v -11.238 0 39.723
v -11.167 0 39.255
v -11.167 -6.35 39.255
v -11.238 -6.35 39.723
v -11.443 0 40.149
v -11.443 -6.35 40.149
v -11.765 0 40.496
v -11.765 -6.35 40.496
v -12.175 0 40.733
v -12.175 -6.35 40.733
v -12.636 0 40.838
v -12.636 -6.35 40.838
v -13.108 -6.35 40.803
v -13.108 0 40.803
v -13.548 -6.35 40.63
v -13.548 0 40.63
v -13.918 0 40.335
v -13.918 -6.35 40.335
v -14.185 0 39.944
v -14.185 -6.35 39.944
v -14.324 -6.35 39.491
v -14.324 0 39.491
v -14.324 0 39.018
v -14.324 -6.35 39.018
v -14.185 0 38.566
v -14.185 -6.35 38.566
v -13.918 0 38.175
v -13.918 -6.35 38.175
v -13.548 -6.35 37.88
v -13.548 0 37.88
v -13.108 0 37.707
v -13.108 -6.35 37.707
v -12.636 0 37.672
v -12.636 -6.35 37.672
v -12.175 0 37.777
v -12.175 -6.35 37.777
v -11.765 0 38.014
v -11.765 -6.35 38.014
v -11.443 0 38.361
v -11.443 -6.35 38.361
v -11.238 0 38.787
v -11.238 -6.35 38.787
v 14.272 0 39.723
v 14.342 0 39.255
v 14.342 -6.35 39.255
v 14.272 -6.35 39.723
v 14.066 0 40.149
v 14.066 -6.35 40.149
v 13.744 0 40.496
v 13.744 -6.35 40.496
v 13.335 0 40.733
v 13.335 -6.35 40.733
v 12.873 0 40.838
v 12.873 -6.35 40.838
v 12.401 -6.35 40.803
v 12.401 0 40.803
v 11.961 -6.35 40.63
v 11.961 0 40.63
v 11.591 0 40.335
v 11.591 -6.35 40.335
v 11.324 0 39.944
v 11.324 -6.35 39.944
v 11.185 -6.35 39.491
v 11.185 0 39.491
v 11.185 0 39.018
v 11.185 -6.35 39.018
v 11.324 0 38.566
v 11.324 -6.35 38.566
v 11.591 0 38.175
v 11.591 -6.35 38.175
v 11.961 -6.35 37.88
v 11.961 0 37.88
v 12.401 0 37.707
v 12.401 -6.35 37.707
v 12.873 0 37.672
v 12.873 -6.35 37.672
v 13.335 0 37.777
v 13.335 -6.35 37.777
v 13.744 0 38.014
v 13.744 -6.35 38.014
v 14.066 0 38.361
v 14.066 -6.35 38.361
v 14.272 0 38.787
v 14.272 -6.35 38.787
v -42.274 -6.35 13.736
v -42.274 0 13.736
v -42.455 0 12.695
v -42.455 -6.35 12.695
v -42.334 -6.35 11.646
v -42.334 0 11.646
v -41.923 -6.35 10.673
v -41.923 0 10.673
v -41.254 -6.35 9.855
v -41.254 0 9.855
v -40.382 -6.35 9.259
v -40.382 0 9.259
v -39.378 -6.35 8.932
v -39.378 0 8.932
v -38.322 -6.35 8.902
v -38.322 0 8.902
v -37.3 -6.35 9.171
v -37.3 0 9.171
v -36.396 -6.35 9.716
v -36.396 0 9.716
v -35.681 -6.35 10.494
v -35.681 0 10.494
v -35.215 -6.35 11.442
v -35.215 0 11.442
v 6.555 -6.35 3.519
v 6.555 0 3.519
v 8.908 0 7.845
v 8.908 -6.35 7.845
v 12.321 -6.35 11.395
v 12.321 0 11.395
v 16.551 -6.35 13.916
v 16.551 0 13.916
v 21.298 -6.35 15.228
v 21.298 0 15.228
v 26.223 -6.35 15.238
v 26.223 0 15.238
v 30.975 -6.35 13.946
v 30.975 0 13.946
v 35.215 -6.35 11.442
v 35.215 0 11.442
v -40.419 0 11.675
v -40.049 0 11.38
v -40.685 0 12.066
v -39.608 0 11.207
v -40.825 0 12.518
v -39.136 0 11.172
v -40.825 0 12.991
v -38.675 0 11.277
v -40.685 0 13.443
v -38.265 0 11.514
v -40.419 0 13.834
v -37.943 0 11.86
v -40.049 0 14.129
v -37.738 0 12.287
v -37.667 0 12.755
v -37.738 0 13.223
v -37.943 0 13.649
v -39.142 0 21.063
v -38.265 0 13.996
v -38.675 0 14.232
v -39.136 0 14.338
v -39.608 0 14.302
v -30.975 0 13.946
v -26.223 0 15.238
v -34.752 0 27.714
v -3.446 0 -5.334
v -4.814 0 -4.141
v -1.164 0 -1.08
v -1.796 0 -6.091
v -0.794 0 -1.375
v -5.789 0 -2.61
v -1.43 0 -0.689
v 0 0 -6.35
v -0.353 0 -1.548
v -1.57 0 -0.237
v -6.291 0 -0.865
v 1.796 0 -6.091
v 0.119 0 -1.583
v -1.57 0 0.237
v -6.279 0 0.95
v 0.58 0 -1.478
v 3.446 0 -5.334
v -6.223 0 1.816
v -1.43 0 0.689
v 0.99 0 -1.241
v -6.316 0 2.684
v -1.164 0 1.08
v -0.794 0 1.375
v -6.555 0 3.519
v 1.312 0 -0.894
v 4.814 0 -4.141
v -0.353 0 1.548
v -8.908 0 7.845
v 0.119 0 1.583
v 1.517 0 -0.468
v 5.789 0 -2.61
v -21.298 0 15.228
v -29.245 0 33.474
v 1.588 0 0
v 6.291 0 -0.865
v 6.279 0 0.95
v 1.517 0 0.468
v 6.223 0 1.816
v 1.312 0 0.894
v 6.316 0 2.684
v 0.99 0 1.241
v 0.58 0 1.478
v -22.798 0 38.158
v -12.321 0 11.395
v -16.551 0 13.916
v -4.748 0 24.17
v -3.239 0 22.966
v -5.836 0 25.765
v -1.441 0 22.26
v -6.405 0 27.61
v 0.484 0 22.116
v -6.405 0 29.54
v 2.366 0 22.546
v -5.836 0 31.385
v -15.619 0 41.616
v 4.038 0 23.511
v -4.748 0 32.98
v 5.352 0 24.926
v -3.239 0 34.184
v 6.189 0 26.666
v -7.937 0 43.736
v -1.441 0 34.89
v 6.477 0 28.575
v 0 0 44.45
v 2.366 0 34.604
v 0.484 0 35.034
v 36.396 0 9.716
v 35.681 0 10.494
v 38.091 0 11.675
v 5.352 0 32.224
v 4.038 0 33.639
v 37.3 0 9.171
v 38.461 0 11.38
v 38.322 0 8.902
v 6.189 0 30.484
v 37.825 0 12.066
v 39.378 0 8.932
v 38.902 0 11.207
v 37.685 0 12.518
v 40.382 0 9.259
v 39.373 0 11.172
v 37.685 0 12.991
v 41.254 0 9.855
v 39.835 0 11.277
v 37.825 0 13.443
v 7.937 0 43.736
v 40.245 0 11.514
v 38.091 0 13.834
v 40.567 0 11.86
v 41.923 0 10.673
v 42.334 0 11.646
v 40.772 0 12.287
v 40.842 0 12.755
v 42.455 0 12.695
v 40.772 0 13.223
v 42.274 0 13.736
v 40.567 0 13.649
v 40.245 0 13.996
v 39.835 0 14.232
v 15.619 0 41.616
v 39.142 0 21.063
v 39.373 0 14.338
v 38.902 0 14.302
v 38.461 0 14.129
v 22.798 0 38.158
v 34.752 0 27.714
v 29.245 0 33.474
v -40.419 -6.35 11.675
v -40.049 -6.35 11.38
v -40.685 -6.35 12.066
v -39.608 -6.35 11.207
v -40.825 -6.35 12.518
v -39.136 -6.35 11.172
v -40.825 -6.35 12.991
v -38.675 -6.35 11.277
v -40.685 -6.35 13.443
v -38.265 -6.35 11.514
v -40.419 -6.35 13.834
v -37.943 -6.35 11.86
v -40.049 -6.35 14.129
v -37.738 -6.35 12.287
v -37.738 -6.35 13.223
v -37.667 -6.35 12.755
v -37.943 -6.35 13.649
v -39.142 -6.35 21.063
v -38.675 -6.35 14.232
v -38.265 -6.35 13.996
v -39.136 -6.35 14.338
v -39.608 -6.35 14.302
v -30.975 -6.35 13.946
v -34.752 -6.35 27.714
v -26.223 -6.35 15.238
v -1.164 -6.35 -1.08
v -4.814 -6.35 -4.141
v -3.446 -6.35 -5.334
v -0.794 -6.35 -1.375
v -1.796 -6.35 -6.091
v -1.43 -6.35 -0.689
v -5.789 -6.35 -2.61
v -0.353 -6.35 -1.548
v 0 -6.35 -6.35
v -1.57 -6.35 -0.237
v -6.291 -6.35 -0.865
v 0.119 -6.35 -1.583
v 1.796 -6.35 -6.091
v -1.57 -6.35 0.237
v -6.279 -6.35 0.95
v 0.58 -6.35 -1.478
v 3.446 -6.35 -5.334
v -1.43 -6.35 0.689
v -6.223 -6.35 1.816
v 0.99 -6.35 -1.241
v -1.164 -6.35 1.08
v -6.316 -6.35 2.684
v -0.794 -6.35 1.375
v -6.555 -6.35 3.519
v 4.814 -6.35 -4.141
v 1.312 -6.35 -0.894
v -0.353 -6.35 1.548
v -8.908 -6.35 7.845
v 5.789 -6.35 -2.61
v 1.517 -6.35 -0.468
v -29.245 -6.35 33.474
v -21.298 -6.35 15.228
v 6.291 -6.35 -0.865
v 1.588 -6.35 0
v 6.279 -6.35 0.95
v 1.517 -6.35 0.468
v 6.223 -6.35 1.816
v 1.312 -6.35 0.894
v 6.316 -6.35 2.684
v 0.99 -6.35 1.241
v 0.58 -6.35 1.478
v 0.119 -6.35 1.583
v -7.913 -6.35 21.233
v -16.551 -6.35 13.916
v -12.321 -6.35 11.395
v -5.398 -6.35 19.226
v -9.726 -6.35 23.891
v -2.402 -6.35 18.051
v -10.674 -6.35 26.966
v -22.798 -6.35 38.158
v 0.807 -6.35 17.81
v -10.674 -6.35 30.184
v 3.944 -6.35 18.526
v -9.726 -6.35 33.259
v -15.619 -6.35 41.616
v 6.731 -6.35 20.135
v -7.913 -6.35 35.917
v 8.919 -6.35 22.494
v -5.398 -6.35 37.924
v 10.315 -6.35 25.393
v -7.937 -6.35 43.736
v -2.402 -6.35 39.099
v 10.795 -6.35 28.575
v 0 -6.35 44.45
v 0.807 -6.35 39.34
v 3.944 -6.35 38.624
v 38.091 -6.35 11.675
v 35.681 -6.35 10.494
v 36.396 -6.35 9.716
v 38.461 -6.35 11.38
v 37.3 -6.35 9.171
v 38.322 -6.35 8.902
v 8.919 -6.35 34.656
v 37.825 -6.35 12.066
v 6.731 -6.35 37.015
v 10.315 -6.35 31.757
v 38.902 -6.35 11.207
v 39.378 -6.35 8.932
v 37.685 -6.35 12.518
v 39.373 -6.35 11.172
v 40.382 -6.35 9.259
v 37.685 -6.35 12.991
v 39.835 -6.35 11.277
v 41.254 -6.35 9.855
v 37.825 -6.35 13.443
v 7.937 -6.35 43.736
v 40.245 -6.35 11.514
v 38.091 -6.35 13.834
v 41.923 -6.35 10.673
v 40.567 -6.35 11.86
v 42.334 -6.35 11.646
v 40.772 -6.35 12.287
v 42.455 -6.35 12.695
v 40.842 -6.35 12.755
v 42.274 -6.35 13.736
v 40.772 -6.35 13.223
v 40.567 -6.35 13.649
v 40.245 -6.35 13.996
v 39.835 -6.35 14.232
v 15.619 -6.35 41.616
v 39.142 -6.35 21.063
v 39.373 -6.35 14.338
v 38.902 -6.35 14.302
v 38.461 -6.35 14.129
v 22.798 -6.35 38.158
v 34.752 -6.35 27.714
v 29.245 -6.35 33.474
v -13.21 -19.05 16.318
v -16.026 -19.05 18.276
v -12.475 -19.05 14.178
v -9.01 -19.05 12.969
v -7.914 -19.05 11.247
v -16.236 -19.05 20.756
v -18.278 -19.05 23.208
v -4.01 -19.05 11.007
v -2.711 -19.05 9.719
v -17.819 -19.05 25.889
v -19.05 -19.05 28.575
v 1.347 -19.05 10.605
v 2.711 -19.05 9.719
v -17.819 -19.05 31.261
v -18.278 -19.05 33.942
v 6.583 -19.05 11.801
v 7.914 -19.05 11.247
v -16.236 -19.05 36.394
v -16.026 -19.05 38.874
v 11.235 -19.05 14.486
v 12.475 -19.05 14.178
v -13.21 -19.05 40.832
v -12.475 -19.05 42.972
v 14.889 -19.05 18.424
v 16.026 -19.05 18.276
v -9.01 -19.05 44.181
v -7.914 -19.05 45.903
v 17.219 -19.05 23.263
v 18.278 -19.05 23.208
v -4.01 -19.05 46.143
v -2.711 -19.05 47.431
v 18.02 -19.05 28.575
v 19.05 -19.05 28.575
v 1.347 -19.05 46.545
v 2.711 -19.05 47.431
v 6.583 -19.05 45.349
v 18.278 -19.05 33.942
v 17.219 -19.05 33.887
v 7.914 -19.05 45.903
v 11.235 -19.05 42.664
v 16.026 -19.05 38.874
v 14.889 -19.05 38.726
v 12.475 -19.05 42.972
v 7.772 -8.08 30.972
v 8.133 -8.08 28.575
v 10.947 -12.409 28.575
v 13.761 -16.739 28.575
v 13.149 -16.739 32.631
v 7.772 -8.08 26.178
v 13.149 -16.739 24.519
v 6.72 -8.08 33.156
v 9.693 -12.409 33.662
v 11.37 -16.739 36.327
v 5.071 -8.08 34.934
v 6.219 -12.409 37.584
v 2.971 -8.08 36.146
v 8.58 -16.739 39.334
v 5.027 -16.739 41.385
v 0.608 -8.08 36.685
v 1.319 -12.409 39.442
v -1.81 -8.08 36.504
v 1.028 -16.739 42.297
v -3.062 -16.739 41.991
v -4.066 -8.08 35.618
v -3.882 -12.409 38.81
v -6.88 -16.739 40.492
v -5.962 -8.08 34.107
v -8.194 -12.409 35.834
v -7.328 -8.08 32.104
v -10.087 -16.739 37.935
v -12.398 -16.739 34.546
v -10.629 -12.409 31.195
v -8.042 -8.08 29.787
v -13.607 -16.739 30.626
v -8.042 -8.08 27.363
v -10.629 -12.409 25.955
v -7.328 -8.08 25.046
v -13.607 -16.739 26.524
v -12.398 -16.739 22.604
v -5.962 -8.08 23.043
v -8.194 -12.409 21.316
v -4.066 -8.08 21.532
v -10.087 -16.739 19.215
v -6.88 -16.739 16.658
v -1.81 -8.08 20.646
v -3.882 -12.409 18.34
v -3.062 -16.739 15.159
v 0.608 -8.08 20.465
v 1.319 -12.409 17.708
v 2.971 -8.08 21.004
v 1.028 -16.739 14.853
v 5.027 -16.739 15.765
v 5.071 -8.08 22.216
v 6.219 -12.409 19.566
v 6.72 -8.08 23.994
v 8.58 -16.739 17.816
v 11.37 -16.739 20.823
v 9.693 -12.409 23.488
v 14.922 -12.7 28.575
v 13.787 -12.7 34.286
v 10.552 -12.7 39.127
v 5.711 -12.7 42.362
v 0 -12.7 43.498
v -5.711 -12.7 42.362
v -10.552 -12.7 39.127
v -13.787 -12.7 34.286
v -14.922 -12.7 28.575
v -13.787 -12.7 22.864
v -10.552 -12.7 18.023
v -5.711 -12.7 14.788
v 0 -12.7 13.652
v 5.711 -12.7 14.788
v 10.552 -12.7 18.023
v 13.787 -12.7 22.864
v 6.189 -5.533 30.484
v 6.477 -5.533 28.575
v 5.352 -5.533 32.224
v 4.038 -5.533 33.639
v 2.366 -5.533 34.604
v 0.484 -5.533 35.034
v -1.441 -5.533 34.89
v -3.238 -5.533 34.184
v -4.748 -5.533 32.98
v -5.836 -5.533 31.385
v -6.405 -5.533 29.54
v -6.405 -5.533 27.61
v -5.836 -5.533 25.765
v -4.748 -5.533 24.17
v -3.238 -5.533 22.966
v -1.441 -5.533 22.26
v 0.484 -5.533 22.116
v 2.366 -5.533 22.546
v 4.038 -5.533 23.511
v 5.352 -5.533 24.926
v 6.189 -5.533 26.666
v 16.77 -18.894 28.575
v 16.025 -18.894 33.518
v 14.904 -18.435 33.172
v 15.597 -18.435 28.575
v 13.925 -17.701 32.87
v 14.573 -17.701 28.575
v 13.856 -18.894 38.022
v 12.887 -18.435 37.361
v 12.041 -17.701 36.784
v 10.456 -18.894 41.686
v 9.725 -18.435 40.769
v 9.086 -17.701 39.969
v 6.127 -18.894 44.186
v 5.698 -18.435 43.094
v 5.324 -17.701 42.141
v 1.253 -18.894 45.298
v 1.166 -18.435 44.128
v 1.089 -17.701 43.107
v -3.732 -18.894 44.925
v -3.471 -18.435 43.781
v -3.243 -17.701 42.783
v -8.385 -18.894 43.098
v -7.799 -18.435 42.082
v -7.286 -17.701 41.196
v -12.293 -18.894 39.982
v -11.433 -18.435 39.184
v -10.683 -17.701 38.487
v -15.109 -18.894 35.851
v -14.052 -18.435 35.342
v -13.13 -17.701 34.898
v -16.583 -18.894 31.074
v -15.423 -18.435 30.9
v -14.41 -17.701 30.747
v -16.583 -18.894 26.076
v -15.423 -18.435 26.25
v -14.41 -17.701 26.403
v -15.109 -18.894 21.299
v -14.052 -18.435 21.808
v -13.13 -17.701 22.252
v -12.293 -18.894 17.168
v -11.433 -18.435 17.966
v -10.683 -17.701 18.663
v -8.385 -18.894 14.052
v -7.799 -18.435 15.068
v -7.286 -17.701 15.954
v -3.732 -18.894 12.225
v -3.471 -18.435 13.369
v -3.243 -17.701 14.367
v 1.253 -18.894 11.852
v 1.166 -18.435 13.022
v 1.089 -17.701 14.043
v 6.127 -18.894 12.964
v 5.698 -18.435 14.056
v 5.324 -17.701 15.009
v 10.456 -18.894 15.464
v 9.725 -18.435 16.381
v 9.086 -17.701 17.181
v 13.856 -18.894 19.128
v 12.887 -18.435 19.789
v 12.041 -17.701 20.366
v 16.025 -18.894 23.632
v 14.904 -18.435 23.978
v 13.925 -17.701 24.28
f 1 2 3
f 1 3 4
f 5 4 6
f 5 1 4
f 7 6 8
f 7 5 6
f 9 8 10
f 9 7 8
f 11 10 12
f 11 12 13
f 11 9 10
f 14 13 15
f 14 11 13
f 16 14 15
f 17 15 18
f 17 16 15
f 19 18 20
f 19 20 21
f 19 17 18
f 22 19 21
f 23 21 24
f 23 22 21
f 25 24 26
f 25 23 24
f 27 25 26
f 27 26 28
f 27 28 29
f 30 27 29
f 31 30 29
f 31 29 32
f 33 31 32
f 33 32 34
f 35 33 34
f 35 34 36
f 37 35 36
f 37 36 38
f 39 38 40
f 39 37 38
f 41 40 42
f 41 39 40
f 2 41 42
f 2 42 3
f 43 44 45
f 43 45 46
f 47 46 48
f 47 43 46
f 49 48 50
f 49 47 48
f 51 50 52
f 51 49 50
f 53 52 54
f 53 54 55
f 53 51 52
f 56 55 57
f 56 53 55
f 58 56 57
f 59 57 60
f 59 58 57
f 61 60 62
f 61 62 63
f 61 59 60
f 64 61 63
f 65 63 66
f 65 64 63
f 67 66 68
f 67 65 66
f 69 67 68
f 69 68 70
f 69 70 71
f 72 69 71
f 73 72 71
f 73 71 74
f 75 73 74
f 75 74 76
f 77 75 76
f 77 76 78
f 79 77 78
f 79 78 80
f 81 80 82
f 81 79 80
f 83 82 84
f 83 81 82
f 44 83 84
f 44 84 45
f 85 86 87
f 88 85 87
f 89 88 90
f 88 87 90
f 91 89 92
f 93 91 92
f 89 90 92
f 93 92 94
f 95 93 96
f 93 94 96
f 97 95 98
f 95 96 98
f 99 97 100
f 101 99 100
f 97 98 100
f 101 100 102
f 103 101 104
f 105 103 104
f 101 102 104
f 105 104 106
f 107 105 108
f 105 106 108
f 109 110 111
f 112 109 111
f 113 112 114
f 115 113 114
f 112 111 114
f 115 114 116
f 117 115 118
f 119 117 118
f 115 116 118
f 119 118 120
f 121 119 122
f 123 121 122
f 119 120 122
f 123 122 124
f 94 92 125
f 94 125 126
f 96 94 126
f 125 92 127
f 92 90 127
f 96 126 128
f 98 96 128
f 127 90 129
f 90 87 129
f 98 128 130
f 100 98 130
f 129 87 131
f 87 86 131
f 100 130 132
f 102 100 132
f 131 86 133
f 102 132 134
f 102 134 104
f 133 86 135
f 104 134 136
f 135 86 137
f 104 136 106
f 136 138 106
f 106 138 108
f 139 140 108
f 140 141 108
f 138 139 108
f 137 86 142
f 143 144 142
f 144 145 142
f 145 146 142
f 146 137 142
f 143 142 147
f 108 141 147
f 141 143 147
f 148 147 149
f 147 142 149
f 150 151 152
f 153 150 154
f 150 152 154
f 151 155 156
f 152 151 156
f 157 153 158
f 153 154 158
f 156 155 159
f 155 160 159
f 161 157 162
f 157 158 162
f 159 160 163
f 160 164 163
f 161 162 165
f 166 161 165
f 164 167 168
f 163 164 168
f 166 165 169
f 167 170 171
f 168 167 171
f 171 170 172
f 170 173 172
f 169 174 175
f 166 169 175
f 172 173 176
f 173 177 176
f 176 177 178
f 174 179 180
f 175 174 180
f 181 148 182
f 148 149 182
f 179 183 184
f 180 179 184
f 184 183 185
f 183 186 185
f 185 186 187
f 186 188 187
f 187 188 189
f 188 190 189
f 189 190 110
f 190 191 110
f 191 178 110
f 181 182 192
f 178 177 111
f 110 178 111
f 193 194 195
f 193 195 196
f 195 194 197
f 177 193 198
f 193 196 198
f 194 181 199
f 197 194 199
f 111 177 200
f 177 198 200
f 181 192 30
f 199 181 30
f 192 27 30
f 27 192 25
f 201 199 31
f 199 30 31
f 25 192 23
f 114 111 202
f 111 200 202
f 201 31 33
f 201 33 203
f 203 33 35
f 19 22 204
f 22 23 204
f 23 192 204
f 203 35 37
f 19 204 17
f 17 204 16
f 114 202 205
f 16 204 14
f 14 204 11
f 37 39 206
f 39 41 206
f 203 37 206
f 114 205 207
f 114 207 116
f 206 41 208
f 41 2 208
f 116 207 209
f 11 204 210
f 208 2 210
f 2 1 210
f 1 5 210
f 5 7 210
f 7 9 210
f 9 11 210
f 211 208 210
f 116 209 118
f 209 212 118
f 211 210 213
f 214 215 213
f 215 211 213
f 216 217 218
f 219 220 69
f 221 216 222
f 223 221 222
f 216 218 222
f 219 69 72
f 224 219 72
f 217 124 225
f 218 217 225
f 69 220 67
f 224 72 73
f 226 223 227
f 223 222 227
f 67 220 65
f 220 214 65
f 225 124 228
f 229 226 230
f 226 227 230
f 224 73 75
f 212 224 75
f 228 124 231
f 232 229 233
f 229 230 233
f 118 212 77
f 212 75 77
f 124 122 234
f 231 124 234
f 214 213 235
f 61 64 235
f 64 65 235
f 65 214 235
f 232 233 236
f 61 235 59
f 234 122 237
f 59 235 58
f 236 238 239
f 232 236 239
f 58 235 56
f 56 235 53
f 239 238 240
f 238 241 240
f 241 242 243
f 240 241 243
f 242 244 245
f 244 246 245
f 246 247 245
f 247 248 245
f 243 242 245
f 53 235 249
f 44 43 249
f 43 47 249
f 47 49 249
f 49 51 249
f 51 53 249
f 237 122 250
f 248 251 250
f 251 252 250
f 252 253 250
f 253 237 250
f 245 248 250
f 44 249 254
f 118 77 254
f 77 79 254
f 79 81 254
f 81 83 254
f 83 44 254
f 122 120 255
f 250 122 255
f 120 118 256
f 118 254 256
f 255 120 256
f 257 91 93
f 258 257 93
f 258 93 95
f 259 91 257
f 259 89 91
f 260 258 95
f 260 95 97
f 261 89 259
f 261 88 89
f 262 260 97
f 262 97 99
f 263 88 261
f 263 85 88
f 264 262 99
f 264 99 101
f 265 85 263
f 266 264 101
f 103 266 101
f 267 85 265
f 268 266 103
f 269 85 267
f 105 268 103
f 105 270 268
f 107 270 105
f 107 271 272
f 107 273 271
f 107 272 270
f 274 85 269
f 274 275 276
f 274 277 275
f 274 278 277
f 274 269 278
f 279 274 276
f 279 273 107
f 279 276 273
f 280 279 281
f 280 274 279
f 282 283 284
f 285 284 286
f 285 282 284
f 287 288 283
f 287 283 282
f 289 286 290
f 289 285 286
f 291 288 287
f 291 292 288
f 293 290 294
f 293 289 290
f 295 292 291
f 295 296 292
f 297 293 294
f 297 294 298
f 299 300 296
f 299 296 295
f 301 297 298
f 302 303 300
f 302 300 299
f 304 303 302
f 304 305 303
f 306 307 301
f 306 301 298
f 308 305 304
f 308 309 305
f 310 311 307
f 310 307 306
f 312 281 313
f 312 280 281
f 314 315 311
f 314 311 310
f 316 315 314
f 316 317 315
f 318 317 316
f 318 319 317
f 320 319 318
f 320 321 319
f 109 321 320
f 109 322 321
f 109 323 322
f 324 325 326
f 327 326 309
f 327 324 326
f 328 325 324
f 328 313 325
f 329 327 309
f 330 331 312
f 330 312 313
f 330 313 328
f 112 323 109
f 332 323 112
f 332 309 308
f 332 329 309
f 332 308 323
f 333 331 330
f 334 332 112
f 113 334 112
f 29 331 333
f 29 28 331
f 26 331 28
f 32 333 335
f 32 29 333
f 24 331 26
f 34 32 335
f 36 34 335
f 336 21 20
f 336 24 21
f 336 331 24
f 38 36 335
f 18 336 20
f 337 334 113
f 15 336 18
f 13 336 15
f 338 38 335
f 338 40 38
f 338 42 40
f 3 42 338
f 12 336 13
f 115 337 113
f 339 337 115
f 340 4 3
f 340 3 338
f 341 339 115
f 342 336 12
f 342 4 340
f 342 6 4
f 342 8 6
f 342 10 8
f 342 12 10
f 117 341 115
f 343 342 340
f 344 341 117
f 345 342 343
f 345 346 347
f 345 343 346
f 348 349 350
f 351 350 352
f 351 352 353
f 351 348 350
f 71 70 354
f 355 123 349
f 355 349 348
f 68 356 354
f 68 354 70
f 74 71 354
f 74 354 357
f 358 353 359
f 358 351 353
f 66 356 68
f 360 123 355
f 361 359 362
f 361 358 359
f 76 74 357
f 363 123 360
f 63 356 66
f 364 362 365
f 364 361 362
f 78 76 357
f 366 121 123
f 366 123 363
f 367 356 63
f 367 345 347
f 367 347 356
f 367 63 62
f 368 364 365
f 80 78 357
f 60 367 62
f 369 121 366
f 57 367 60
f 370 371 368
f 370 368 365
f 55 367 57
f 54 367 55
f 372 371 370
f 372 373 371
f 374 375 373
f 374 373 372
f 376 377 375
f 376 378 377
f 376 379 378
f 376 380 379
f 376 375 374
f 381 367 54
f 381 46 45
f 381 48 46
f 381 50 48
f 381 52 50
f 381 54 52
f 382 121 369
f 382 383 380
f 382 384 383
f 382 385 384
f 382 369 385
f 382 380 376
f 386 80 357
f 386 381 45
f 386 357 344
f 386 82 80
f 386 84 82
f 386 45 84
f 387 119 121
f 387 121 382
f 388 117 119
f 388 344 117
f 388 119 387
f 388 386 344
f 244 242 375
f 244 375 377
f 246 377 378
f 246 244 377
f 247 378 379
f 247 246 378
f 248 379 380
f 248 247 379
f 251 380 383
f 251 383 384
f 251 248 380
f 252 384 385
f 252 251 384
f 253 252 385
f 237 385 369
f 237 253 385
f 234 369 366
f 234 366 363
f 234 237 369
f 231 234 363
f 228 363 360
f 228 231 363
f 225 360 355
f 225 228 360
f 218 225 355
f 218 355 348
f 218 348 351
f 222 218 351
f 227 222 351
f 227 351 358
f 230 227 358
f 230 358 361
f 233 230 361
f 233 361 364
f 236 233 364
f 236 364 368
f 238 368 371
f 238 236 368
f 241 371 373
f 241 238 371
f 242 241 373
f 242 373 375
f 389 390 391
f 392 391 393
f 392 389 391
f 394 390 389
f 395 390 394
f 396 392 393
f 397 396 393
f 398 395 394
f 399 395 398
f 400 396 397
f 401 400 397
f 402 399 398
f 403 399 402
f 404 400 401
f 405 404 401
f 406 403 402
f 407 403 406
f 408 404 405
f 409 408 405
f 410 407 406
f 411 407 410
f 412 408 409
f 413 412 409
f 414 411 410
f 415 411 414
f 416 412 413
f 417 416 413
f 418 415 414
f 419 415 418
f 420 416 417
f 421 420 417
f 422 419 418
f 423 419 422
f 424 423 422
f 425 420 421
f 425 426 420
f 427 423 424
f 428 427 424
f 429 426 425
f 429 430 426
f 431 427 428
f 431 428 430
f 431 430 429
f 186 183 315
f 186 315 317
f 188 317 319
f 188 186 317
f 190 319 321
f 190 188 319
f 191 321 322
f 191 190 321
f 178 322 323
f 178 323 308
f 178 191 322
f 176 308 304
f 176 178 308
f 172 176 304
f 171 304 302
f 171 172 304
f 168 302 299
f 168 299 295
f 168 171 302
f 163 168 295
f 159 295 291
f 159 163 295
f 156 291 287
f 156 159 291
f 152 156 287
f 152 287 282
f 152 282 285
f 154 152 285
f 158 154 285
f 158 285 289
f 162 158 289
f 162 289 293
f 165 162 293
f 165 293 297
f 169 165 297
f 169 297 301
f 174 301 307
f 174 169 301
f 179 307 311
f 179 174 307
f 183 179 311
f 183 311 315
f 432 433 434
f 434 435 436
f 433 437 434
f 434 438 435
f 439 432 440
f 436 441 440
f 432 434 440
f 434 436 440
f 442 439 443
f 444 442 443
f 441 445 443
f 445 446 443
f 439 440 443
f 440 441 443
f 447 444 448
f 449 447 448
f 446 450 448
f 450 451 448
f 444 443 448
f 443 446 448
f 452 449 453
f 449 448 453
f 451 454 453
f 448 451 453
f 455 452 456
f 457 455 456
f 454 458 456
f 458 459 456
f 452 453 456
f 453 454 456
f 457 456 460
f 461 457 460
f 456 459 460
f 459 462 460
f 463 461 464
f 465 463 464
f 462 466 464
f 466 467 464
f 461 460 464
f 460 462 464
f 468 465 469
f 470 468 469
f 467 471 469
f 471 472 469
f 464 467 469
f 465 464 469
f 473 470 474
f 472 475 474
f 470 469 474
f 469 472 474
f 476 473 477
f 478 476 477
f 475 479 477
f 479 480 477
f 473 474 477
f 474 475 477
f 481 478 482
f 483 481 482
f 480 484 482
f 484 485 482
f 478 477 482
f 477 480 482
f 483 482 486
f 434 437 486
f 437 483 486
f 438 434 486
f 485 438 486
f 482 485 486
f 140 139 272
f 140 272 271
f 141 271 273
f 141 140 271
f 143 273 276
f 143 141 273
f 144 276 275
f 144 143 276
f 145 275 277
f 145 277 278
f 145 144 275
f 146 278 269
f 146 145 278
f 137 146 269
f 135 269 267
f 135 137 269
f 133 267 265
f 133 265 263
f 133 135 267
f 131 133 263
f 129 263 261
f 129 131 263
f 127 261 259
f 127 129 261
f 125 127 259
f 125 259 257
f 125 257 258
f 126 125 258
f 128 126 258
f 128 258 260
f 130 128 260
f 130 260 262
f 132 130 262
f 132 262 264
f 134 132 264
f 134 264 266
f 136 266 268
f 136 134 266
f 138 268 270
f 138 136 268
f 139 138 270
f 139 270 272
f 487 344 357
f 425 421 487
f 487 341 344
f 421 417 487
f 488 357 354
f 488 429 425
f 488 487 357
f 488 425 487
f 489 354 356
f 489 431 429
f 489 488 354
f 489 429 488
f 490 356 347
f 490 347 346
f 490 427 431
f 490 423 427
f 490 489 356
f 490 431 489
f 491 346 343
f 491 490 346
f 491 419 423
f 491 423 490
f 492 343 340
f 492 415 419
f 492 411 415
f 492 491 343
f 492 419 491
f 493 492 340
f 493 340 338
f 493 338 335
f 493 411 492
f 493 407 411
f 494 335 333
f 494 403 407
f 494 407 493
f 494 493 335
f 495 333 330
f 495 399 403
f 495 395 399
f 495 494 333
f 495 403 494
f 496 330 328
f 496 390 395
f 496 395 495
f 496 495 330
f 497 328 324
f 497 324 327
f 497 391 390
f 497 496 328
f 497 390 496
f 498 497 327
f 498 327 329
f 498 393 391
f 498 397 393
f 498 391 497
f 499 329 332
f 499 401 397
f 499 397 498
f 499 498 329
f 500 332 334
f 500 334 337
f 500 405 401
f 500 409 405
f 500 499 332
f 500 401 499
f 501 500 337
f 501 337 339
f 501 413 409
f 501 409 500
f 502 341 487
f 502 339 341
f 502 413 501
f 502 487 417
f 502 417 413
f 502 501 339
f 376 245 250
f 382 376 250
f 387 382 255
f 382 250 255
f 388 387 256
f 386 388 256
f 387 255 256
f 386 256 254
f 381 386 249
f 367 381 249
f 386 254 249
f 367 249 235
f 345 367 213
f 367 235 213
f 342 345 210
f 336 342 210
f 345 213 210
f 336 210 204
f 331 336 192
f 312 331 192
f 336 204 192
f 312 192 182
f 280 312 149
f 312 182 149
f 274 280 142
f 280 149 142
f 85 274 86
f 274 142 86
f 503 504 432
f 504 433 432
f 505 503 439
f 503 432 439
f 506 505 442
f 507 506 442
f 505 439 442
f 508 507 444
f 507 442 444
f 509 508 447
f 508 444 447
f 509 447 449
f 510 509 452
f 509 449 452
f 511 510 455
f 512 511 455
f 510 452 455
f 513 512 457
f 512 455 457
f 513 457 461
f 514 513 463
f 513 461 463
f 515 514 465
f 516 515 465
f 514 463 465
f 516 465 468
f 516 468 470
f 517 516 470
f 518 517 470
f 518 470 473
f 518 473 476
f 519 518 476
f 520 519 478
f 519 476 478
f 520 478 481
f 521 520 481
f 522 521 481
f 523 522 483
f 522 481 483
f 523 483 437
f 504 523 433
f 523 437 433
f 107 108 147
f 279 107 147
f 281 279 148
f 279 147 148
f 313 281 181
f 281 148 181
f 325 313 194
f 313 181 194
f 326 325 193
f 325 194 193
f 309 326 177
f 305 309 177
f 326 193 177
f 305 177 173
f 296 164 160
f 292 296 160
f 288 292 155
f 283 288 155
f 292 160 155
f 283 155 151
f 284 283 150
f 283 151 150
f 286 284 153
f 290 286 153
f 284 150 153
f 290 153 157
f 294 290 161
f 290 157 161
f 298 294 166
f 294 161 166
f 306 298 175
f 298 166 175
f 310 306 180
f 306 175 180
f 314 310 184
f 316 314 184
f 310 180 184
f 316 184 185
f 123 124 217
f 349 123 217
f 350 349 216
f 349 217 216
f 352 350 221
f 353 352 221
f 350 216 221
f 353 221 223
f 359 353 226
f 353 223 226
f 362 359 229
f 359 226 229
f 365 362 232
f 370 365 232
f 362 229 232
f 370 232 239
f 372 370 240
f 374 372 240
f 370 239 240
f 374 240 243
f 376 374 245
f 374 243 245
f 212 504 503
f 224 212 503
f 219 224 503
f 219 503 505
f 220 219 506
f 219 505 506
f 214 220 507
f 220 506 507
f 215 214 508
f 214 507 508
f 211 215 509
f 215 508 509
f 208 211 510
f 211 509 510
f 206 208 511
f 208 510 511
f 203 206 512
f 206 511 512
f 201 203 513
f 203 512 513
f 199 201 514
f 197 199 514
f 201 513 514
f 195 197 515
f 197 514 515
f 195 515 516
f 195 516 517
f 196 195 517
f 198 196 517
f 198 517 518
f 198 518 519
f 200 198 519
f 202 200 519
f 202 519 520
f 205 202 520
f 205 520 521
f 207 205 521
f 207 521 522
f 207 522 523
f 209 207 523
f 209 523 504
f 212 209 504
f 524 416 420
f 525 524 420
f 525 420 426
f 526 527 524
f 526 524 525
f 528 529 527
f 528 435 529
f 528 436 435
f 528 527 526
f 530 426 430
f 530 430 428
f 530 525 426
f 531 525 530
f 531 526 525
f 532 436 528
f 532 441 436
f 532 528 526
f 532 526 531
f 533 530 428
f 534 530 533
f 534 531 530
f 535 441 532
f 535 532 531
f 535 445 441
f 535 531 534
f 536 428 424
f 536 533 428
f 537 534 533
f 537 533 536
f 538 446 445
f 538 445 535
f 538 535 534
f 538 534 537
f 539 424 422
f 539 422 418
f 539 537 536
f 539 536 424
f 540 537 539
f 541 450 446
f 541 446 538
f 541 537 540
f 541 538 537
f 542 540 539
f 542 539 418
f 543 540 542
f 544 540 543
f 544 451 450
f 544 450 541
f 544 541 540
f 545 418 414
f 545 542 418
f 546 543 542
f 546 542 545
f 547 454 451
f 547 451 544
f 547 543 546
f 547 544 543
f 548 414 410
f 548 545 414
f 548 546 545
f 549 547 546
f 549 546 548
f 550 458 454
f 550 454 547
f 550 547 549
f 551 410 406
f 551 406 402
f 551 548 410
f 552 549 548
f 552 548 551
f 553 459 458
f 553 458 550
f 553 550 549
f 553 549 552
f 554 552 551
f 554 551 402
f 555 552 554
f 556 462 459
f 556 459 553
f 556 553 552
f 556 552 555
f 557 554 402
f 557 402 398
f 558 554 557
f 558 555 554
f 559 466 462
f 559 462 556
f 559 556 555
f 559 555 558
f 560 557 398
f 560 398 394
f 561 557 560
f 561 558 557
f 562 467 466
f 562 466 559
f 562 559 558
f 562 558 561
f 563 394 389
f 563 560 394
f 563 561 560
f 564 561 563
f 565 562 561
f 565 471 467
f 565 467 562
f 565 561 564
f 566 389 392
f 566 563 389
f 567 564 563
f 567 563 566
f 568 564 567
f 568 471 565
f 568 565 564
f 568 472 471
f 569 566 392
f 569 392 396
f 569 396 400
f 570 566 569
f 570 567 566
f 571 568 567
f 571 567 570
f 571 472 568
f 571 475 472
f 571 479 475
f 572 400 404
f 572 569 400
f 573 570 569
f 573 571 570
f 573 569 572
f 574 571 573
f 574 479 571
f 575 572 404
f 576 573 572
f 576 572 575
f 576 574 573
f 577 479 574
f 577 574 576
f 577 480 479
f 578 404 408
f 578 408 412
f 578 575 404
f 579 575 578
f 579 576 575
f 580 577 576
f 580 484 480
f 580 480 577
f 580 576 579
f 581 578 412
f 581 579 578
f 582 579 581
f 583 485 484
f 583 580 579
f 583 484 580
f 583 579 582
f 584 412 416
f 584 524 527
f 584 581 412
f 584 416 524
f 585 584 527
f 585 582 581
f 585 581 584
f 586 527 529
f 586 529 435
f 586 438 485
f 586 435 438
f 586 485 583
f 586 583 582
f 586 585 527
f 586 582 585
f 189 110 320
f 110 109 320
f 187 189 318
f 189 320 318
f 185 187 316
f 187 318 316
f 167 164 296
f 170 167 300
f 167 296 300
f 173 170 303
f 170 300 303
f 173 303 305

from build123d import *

# Parameters (mm, degrees)
F0_R        = 1.5875
F1_DEPTH    = 6.35
F2_R        = 10.795
F4_R        = 19.05
F6_T        = 3.175
F6_T3_DEPTH = 12.7
F7_R        = 6.477
F8_DEPTH    = 19.051
F9_R        = 5.08


# Not quite as in the source:
# - two fillets or chamfers of one size are made in one step
# - a shell that OpenCascade refuses in one call is made with other operations: the cavity is built on its own and cut out


with BuildPart() as f1:
    # F0 (on Front) → F1 (new body)
    with BuildSketch(Plane.XZ):
        with BuildLine():
            ThreePointArc((35.2153805779, 11.4421707601), (39.8917386836, 9.0594472943), (42.2744621493, 13.7358054))
            ThreePointArc((42.2744621493, 13.7358054), (0, 44.45), (-42.2744621493, 13.7358054))
            ThreePointArc((-42.2744621493, 13.7358054), (-39.8917386836, 9.0594472943), (-35.2153805779, 11.4421707601))
            ThreePointArc((-35.2153805779, 11.4421707601), (-18.0952762982, 14.4949657749), (-6.0392088785, 1.9622579143))
            ThreePointArc((-6.0392088785, 1.9622579143), (0, -6.35), (6.0392088785, 1.9622579143))
            ThreePointArc((6.0392088785, 1.9622579143), (18.0952762982, 14.4949657749), (35.2153805779, 11.4421707601))
        make_face()
        Circle(F0_R, mode=Mode.SUBTRACT)
        with Locations((-39.2548577101, 12.7546764428)):
            Circle(F0_R, mode=Mode.SUBTRACT)
        with Locations((39.2548577101, 12.7546764428)):
            Circle(F0_R, mode=Mode.SUBTRACT)
        with Locations((-12.7546764428, 39.2548577101)):
            Circle(F0_R, mode=Mode.SUBTRACT)
        with Locations((12.7546764428, 39.2548577101)):
            Circle(F0_R, mode=Mode.SUBTRACT)
    extrude(amount=F1_DEPTH)

    # F2 (on face) → F5 section 0
    with BuildSketch(Plane.XZ.offset(6.35)):
        with Locations((0, 28.575)):
            Circle(F2_R)
    # F4 (on offset) → F5 section 1
    with BuildSketch(Plane.XZ.offset(19.05)):
        with Locations((0, 28.575)):
            Circle(F4_R)
    loft()

    # F6: shell of thickness 3.175, made by hand


with BuildPart() as f6_core1:
    # F6_t2: copy of F1
    add(f1.part)

    # the walls: a layer under each face that stays
    f6_faces = [f6_core1.faces().sort_by_distance(p)[0] for p in [
        (18.0952762982, -3.175, 14.4949657749),
        (0, -3.175, -6.35),
        (39.8917386836, -3.175, 9.0594472943),
        (0, 0, 19.05),
        (-28.3040667791, -6.35, 19.05),
        (-18.0952762982, -3.175, 14.4949657749),
        (0, -3.175, 44.45),
        (-39.8917386836, -3.175, 9.0594472943),
        (-1.5875, -3.175, 0),
        (-40.8423577101, -3.175, 12.7546764428),
        (37.6673577101, -3.175, 12.7546764428),
        (-14.3421764428, -3.175, 39.2548577101),
        (11.1671764428, -3.175, 39.2548577101),
        (-14.9225, -12.7, 28.575),
    ]]
    thicken(f6_faces, amount=-F6_T, mode=Mode.SUBTRACT)

    # F6_s4 → F6_t3 (cut)
    with BuildSketch(Plane.XZ.offset(-3.175)):
        Polygon((6.0999585135, 1.9634355139), (2.9838498192, 2.8256269079), (2.7217112336, 1.8979499721), (3.0196044392, 0.9811289571), align=None)
        Polygon((35.1655409151, 11.4074157187), (37.179742419, 13.9365459438), (37.9370918115, 13.3401207322), (38.2349850172, 12.4232997172), align=None)
        Polygon((-6.0999585135, 1.9634355139), (-3.0196044392, 0.9811289571), (-2.7217112336, 1.8979499721), (-2.9838498192, 2.8256269079), align=None)
        Polygon((-35.1655409151, 11.4074157187), (-37.179742419, 13.9365459438), (-37.9370918115, 13.3401207322), (-38.2349850172, 12.4232997172), align=None)
    extrude(amount=F6_T3_DEPTH, mode=Mode.SUBTRACT)

    # F6_s5 → F6_t6 (revolve, cut)
    with BuildSketch(Plane.XY.offset(28.575)):
        Polygon((10.8216205848, -6.3644466199), (10.795, -3.175), (4.9444718097, -3.175), (8.1329415182, -8.0803380131), align=None)
    revolve(axis=Axis((0, -6.35, 28.575), (0, -1, 0)), mode=Mode.SUBTRACT)


with BuildPart() as f1_1:
    add(f1.part)

    # what is left inside the walls is the cavity
    f6_cavity = [f6_core1.part.solids().sort_by_distance(p)[0] for p in [
        (-10.483081, -11.754195, 28.575),
    ]]
    add(f6_cavity, mode=Mode.SUBTRACT)

    # F7 (on face) → F8 (cut, through all)
    with BuildSketch(Plane.XZ.offset(19.05)):
        with Locations((0, 28.575)):
            Circle(F7_R)
    extrude(amount=-F8_DEPTH, mode=Mode.SUBTRACT)

    # F9
    f9_edges = [f1_1.edges().sort_by_distance(p)[0] for p in [
        (6.039209, -3.175, 1.962258),
        (-6.039209, -3.175, 1.962258),
        (-15.263222, -19.05, 28.575),
    ]]
    fillet(f9_edges, radius=F9_R)


solid = f1_1.part
